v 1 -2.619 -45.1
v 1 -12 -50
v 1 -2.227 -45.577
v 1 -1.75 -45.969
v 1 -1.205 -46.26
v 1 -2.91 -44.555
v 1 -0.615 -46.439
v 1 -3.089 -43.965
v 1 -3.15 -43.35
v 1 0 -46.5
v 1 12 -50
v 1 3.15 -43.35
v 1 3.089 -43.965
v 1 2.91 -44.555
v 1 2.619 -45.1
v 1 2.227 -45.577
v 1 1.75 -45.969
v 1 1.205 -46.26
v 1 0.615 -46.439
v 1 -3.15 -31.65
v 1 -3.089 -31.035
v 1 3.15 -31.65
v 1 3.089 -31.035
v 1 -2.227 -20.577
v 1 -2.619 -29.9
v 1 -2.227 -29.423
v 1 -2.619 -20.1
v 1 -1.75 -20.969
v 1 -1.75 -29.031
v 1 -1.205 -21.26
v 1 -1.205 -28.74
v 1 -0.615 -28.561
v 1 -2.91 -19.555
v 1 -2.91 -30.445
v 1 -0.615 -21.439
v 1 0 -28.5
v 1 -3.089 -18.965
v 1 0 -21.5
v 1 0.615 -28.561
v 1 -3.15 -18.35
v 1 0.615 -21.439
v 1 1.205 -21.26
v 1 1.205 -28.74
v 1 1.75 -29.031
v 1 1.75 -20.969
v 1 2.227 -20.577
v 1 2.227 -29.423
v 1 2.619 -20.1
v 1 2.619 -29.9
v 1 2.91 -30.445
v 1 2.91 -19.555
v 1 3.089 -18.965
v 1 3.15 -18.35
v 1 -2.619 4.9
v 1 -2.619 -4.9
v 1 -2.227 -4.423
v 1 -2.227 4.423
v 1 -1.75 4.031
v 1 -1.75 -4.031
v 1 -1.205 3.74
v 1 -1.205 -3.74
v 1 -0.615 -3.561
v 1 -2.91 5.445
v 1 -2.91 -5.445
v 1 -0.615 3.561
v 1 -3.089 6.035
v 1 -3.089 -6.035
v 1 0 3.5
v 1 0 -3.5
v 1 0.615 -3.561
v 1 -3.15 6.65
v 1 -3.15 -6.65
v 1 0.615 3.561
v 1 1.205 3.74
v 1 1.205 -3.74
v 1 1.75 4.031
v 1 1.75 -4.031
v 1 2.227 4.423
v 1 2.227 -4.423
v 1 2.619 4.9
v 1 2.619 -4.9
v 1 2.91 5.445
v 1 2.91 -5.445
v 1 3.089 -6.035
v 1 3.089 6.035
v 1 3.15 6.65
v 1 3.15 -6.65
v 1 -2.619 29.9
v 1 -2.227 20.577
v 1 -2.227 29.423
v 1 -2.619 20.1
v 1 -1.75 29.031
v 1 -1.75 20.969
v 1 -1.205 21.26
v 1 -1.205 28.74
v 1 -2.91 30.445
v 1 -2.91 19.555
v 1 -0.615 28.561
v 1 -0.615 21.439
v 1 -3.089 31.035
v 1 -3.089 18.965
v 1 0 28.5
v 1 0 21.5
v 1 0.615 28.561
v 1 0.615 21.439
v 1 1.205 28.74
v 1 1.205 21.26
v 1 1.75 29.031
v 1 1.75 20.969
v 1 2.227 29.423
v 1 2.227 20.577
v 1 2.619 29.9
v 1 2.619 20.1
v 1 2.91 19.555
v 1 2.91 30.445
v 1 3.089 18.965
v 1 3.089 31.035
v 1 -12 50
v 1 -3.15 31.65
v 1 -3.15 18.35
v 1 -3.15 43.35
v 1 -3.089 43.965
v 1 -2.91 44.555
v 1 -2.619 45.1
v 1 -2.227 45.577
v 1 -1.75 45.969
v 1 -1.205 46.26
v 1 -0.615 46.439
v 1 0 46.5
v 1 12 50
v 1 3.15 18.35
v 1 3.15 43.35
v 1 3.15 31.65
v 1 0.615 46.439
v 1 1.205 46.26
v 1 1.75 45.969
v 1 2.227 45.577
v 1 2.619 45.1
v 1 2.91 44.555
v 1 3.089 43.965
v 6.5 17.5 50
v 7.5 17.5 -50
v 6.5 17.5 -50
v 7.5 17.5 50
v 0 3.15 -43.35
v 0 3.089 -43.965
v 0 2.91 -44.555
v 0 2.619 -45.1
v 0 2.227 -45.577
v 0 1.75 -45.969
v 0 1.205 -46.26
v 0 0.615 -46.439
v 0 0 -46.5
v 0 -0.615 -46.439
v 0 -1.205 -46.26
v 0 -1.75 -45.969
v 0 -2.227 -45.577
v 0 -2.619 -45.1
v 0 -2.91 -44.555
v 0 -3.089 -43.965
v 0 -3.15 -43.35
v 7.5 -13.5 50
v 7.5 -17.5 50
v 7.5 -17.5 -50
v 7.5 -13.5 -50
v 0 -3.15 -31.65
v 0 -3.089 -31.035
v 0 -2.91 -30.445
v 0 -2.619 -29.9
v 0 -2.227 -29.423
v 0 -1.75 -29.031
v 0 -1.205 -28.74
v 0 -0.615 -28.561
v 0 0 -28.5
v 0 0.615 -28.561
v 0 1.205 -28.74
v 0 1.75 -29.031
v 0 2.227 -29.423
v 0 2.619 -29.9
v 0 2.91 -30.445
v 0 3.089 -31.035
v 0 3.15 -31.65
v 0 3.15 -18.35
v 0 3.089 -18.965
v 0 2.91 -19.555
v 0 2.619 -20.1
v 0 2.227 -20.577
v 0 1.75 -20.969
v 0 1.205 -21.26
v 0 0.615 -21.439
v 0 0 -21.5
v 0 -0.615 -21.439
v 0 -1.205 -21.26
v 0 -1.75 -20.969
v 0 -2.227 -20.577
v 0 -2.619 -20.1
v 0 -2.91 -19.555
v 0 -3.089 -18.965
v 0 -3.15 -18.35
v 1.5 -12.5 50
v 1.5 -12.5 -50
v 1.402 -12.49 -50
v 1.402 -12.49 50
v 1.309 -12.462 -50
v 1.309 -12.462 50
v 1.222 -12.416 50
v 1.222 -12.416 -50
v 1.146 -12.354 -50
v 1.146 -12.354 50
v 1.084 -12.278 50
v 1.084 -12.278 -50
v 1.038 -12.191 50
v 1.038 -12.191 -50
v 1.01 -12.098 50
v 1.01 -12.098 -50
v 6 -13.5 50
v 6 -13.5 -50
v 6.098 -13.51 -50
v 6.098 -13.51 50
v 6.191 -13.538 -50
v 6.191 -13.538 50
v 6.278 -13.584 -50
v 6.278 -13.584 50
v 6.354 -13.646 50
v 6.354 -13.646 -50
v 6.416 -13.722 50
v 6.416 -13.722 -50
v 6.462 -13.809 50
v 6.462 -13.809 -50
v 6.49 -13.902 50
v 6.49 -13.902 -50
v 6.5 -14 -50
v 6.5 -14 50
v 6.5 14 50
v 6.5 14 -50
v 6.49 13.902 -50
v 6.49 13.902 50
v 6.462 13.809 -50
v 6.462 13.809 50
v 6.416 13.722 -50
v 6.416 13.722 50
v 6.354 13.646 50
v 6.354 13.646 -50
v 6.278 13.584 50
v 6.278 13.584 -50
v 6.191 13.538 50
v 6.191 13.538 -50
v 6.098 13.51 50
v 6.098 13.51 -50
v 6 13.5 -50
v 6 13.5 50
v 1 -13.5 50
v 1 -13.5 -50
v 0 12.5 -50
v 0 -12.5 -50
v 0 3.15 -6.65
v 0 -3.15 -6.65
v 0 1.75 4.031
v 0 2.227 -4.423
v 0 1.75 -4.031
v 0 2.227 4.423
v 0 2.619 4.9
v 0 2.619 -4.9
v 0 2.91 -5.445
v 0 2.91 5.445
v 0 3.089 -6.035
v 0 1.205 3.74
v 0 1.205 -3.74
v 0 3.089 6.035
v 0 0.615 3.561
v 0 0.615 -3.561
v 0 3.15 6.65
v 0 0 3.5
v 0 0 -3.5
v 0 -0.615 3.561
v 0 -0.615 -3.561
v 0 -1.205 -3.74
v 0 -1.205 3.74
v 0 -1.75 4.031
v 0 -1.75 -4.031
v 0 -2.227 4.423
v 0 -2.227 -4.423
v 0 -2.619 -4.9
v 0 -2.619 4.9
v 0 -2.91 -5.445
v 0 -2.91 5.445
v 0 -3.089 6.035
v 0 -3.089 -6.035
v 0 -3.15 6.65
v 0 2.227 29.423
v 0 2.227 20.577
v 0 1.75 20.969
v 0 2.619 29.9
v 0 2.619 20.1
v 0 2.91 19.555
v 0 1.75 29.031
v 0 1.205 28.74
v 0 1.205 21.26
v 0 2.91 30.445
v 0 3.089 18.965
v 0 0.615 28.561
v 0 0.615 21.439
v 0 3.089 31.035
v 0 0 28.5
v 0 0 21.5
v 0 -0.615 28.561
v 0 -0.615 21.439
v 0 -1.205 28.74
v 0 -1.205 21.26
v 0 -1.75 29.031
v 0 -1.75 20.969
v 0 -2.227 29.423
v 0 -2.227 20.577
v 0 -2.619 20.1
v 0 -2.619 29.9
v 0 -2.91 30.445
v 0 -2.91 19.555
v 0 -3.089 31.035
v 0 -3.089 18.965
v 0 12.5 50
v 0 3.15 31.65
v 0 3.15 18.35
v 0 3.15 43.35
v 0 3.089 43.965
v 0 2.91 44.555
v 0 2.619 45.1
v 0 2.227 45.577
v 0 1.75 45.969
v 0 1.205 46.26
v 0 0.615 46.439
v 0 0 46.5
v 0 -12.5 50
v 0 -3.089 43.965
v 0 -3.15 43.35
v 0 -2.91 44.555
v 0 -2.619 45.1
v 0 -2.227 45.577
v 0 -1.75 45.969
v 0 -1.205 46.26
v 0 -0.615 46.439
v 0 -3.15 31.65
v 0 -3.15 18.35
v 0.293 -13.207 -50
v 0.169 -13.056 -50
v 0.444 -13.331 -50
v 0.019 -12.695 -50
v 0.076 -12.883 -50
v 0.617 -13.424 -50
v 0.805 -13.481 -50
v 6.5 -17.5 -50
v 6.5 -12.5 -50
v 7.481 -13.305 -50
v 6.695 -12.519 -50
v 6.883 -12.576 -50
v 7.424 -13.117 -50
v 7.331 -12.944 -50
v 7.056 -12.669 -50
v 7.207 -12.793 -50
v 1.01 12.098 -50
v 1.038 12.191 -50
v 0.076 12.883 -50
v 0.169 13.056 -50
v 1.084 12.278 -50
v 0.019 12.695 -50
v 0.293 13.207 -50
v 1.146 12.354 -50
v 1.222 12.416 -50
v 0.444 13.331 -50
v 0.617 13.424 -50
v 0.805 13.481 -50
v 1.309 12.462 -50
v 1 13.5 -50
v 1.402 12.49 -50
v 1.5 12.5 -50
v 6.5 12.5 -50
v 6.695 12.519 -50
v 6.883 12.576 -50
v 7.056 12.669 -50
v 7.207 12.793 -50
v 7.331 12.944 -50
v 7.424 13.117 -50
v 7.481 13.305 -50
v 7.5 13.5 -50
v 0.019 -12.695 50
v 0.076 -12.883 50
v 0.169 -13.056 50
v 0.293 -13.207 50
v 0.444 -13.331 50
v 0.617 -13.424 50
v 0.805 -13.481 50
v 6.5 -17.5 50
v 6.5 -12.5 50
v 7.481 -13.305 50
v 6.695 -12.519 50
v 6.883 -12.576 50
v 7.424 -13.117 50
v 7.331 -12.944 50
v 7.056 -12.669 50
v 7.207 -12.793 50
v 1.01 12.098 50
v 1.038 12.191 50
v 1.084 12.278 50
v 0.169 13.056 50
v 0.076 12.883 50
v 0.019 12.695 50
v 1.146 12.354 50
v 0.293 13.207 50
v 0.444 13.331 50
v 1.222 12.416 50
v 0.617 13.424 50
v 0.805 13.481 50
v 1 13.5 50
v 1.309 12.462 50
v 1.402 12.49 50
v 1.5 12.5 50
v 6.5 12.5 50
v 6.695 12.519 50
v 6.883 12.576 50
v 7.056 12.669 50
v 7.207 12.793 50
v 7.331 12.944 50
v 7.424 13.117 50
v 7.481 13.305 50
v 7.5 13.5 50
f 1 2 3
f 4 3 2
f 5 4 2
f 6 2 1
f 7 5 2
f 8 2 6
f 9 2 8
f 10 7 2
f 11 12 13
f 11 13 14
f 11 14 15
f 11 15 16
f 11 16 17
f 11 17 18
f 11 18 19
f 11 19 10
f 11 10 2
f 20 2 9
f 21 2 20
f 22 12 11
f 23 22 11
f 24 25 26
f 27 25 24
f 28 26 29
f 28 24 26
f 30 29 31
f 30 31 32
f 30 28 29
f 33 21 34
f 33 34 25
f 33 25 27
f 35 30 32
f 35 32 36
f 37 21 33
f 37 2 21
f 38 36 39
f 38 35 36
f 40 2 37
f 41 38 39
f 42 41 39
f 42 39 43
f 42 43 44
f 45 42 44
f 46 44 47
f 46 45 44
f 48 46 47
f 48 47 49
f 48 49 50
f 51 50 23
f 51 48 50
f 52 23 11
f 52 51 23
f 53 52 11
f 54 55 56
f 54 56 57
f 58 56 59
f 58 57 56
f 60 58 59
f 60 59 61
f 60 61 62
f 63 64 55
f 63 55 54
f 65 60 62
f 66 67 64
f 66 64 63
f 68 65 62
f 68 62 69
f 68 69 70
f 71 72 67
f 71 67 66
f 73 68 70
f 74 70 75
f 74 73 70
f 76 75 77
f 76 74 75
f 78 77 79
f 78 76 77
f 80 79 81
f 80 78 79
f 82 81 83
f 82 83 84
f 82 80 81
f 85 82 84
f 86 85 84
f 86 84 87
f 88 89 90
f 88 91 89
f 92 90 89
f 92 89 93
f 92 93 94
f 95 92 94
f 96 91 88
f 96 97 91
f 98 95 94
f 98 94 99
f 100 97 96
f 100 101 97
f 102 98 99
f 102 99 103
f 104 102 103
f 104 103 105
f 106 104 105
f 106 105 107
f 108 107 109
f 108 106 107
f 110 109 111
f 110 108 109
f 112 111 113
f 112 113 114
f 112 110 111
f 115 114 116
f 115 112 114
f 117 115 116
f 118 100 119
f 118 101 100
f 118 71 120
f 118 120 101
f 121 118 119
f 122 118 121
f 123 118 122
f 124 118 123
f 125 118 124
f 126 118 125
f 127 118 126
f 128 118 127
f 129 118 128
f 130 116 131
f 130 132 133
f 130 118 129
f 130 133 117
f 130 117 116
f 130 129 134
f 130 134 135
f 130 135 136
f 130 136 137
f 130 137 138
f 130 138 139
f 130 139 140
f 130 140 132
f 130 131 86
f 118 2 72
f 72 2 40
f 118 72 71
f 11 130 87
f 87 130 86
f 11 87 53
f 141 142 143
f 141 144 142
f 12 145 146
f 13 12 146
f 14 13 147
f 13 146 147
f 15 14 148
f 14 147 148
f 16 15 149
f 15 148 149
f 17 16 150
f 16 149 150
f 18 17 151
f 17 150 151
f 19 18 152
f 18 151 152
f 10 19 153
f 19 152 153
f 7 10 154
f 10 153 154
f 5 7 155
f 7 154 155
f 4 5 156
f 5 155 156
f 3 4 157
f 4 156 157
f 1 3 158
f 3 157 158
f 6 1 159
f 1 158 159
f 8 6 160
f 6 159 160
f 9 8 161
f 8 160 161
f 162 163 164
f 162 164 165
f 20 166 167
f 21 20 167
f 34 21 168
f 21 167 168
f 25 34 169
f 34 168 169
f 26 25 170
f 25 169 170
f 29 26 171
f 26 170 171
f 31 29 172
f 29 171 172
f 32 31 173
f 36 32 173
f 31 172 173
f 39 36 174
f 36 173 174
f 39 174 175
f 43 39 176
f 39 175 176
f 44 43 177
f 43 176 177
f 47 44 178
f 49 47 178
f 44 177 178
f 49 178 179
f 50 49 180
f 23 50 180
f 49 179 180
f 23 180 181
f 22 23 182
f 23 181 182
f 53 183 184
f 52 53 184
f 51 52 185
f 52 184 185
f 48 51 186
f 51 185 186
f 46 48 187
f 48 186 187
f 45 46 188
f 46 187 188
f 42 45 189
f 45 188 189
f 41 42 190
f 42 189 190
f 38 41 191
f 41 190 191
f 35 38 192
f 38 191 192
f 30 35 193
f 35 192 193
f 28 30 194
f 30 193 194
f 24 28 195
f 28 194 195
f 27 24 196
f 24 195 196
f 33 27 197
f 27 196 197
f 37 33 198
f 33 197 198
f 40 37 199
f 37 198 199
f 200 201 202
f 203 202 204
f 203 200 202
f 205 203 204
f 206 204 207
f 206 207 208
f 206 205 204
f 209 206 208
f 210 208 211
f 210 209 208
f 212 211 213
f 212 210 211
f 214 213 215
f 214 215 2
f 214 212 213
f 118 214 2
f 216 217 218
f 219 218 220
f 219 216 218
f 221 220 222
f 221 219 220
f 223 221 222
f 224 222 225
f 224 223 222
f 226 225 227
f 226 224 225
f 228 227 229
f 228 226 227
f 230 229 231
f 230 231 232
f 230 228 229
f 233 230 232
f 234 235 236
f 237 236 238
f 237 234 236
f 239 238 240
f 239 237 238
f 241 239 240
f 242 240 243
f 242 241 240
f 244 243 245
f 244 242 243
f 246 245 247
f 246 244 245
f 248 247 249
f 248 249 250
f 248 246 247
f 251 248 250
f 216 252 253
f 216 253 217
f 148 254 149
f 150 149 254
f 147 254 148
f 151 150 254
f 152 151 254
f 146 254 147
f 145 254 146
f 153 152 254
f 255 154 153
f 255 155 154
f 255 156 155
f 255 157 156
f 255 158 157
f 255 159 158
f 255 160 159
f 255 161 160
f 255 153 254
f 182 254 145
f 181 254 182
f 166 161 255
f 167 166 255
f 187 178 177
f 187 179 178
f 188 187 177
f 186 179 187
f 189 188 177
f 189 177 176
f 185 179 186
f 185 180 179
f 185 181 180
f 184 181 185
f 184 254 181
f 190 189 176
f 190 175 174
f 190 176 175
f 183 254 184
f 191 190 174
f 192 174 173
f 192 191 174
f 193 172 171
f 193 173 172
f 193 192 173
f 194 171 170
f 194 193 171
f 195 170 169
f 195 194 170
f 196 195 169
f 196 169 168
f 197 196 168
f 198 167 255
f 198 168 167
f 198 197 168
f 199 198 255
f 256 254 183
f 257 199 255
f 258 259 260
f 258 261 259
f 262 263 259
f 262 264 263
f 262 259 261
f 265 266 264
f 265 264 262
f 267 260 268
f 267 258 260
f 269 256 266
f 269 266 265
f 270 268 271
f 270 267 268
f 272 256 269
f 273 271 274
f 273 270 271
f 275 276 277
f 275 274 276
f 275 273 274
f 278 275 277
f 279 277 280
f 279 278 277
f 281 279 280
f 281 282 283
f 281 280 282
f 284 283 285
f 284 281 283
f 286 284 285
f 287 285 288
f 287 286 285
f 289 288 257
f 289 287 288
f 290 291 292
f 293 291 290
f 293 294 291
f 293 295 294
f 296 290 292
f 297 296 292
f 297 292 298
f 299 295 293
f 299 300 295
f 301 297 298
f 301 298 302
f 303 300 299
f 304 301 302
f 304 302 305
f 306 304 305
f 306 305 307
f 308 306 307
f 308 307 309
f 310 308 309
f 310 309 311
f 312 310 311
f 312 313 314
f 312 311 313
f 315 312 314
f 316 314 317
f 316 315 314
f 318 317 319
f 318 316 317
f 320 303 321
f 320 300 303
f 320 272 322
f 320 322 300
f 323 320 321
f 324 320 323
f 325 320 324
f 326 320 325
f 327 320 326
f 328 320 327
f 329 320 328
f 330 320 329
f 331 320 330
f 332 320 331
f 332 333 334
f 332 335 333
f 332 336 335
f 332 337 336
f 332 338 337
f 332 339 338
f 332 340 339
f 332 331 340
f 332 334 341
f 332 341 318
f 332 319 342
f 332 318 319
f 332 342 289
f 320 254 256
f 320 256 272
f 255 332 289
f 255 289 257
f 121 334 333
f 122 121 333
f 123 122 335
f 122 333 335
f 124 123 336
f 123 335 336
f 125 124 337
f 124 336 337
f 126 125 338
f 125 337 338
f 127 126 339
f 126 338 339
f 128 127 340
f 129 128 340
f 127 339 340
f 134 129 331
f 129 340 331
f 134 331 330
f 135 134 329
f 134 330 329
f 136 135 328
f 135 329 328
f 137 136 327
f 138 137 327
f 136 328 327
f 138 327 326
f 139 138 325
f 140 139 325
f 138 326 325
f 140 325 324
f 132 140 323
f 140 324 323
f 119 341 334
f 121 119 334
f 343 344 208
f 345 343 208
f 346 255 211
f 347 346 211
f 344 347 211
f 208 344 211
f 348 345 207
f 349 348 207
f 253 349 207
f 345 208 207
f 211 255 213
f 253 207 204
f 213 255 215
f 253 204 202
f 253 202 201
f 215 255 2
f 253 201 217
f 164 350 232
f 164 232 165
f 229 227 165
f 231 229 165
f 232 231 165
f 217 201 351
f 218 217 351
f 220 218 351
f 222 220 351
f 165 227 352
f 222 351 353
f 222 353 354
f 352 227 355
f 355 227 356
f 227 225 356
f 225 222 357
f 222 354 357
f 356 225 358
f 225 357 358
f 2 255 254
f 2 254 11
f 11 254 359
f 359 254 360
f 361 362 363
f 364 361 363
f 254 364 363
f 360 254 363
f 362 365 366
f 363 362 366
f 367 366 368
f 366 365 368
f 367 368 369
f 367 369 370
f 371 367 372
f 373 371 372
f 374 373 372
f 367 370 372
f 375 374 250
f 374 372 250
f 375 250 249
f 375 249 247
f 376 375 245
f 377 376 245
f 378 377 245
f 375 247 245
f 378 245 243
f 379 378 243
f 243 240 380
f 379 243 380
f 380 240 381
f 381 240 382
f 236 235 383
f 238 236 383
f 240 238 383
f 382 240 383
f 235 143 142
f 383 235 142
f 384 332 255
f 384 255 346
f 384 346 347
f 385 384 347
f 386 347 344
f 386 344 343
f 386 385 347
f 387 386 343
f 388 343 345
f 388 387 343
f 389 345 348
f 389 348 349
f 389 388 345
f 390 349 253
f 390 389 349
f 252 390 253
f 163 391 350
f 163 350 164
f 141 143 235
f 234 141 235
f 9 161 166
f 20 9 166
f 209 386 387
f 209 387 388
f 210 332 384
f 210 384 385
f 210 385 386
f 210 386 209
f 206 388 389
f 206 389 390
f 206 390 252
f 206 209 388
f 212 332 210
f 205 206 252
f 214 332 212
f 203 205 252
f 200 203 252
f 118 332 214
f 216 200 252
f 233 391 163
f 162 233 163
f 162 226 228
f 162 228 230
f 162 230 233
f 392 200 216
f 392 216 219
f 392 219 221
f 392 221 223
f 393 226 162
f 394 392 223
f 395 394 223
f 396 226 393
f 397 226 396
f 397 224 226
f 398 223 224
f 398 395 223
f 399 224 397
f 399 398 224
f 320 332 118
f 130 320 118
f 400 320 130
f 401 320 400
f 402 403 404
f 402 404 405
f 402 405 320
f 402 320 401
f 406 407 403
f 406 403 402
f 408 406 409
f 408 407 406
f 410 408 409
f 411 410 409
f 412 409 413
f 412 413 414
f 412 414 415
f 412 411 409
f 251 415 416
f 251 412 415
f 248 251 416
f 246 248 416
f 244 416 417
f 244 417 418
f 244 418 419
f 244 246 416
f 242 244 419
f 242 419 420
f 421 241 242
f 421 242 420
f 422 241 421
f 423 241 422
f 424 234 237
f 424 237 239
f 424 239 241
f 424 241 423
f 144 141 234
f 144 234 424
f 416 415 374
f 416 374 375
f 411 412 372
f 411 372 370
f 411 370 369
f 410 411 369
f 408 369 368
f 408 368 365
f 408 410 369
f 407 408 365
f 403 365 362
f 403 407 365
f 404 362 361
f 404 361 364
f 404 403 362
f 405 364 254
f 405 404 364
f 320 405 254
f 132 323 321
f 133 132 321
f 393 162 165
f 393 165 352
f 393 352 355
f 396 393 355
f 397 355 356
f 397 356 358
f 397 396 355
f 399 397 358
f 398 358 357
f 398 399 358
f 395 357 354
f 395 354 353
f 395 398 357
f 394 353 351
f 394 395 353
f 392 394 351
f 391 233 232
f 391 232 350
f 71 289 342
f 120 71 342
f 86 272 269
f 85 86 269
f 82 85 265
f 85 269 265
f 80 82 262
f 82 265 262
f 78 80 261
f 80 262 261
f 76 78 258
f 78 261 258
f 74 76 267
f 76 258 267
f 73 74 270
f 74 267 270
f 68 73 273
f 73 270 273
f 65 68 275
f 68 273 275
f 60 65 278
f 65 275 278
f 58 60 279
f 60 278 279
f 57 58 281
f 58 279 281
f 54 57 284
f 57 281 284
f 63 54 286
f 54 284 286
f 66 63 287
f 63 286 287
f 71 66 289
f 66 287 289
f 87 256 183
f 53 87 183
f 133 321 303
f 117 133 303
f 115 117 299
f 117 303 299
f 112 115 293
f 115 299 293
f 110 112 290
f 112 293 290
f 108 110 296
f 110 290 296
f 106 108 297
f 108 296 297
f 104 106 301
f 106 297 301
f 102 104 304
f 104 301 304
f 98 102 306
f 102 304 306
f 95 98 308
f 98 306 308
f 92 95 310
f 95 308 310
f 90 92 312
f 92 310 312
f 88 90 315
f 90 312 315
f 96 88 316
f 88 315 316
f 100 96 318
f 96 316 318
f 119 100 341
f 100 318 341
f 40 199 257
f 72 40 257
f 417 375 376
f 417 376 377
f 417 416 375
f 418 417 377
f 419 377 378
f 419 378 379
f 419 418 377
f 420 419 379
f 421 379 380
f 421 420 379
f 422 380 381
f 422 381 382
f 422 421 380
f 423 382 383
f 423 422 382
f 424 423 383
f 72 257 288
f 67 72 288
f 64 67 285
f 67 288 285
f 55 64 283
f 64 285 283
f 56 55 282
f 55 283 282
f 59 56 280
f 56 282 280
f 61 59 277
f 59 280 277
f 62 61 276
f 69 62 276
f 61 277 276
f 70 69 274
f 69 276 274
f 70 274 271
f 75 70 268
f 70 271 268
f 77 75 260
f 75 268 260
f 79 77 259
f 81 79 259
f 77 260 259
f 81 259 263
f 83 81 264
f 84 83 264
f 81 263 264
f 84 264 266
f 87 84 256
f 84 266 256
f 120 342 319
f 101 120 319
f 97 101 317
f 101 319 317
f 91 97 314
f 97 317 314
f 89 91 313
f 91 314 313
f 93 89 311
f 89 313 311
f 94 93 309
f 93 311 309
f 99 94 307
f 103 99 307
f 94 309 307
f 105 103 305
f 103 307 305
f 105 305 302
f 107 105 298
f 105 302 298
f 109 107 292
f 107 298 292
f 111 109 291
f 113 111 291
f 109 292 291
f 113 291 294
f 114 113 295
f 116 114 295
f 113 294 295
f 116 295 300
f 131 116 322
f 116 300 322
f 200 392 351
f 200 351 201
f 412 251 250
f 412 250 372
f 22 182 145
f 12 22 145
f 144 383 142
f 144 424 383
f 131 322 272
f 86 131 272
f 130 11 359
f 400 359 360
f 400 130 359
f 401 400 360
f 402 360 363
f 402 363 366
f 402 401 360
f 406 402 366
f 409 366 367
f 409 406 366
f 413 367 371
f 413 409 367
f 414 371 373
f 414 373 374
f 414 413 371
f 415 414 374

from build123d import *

# Parameters (mm, degrees)
BOSS_EXTRUDE1_DEPTH = 50
CUT_EXTRUDE1_DEPTH  = 7.5
LPATTERN1_COUNT     = 4
LPATTERN1_PITCH     = 25


with BuildPart() as part:
    # Sketch1 → Boss-Extrude1 (new, symmetric)
    with BuildSketch(Plane.XY):
        with BuildLine():
            Line((7.5, 17.5), (6.5, 17.5))
            Line((6.5, 17.5), (6.5, 14))
            ThreePointArc((6.5, 14), (6.353553391, 13.646446609), (6, 13.5))
            Line((6, 13.5), (1, 13.5))
            ThreePointArc((1, 13.5), (0.292893219, 13.207106781), (0, 12.5))
            Line((0, 12.5), (0, -12.5))
            ThreePointArc((0, -12.5), (0.292893219, -13.207106781), (1, -13.5))
            Line((1, -13.5), (6, -13.5))
            ThreePointArc((6, -13.5), (6.353553391, -13.646446609), (6.5, -14))
            Line((6.5, -14), (6.5, -17.5))
            Line((6.5, -17.5), (7.5, -17.5))
            Line((7.5, -17.5), (7.5, -13.5))
            ThreePointArc((7.5, -13.5), (7.207106781, -12.792893219), (6.5, -12.5))
            Line((6.5, -12.5), (1.5, -12.5))
            ThreePointArc((1.5, -12.5), (1.146446609, -12.353553391), (1, -12))
            Line((1, -12), (1, 12))
            ThreePointArc((1, 12), (1.146446609, 12.353553391), (1.5, 12.5))
            Line((1.5, 12.5), (6.5, 12.5))
            ThreePointArc((6.5, 12.5), (7.207106781, 12.792893219), (7.5, 13.5))
            Line((7.5, 13.5), (7.5, 17.5))
        make_face()
    extrude(amount=BOSS_EXTRUDE1_DEPTH, both=True)

    # Sketch2 → Cut-Extrude1 (cut)
    with BuildSketch(Plane(origin=(0, 0, 0), x_dir=(0, 0, -1), z_dir=(1, 0, 0))):
        with BuildLine():
            Line((-43.35, 3.15), (-31.65, 3.15))
            ThreePointArc((-31.65, 3.15), (-28.5, 0), (-31.65, -3.15))
            Line((-31.65, -3.15), (-43.35, -3.15))
            ThreePointArc((-43.35, -3.15), (-46.5, 0), (-43.35, 3.15))
        make_face()
    cut_extrude1 = extrude(amount=CUT_EXTRUDE1_DEPTH, mode=Mode.SUBTRACT)

    # LPattern1: Cut-Extrude1 ×4
    with Locations(*[(0, 0, -i * LPATTERN1_PITCH) for i in range(1, LPATTERN1_COUNT)]):
        add(cut_extrude1, mode=Mode.SUBTRACT)


solid = part.part
